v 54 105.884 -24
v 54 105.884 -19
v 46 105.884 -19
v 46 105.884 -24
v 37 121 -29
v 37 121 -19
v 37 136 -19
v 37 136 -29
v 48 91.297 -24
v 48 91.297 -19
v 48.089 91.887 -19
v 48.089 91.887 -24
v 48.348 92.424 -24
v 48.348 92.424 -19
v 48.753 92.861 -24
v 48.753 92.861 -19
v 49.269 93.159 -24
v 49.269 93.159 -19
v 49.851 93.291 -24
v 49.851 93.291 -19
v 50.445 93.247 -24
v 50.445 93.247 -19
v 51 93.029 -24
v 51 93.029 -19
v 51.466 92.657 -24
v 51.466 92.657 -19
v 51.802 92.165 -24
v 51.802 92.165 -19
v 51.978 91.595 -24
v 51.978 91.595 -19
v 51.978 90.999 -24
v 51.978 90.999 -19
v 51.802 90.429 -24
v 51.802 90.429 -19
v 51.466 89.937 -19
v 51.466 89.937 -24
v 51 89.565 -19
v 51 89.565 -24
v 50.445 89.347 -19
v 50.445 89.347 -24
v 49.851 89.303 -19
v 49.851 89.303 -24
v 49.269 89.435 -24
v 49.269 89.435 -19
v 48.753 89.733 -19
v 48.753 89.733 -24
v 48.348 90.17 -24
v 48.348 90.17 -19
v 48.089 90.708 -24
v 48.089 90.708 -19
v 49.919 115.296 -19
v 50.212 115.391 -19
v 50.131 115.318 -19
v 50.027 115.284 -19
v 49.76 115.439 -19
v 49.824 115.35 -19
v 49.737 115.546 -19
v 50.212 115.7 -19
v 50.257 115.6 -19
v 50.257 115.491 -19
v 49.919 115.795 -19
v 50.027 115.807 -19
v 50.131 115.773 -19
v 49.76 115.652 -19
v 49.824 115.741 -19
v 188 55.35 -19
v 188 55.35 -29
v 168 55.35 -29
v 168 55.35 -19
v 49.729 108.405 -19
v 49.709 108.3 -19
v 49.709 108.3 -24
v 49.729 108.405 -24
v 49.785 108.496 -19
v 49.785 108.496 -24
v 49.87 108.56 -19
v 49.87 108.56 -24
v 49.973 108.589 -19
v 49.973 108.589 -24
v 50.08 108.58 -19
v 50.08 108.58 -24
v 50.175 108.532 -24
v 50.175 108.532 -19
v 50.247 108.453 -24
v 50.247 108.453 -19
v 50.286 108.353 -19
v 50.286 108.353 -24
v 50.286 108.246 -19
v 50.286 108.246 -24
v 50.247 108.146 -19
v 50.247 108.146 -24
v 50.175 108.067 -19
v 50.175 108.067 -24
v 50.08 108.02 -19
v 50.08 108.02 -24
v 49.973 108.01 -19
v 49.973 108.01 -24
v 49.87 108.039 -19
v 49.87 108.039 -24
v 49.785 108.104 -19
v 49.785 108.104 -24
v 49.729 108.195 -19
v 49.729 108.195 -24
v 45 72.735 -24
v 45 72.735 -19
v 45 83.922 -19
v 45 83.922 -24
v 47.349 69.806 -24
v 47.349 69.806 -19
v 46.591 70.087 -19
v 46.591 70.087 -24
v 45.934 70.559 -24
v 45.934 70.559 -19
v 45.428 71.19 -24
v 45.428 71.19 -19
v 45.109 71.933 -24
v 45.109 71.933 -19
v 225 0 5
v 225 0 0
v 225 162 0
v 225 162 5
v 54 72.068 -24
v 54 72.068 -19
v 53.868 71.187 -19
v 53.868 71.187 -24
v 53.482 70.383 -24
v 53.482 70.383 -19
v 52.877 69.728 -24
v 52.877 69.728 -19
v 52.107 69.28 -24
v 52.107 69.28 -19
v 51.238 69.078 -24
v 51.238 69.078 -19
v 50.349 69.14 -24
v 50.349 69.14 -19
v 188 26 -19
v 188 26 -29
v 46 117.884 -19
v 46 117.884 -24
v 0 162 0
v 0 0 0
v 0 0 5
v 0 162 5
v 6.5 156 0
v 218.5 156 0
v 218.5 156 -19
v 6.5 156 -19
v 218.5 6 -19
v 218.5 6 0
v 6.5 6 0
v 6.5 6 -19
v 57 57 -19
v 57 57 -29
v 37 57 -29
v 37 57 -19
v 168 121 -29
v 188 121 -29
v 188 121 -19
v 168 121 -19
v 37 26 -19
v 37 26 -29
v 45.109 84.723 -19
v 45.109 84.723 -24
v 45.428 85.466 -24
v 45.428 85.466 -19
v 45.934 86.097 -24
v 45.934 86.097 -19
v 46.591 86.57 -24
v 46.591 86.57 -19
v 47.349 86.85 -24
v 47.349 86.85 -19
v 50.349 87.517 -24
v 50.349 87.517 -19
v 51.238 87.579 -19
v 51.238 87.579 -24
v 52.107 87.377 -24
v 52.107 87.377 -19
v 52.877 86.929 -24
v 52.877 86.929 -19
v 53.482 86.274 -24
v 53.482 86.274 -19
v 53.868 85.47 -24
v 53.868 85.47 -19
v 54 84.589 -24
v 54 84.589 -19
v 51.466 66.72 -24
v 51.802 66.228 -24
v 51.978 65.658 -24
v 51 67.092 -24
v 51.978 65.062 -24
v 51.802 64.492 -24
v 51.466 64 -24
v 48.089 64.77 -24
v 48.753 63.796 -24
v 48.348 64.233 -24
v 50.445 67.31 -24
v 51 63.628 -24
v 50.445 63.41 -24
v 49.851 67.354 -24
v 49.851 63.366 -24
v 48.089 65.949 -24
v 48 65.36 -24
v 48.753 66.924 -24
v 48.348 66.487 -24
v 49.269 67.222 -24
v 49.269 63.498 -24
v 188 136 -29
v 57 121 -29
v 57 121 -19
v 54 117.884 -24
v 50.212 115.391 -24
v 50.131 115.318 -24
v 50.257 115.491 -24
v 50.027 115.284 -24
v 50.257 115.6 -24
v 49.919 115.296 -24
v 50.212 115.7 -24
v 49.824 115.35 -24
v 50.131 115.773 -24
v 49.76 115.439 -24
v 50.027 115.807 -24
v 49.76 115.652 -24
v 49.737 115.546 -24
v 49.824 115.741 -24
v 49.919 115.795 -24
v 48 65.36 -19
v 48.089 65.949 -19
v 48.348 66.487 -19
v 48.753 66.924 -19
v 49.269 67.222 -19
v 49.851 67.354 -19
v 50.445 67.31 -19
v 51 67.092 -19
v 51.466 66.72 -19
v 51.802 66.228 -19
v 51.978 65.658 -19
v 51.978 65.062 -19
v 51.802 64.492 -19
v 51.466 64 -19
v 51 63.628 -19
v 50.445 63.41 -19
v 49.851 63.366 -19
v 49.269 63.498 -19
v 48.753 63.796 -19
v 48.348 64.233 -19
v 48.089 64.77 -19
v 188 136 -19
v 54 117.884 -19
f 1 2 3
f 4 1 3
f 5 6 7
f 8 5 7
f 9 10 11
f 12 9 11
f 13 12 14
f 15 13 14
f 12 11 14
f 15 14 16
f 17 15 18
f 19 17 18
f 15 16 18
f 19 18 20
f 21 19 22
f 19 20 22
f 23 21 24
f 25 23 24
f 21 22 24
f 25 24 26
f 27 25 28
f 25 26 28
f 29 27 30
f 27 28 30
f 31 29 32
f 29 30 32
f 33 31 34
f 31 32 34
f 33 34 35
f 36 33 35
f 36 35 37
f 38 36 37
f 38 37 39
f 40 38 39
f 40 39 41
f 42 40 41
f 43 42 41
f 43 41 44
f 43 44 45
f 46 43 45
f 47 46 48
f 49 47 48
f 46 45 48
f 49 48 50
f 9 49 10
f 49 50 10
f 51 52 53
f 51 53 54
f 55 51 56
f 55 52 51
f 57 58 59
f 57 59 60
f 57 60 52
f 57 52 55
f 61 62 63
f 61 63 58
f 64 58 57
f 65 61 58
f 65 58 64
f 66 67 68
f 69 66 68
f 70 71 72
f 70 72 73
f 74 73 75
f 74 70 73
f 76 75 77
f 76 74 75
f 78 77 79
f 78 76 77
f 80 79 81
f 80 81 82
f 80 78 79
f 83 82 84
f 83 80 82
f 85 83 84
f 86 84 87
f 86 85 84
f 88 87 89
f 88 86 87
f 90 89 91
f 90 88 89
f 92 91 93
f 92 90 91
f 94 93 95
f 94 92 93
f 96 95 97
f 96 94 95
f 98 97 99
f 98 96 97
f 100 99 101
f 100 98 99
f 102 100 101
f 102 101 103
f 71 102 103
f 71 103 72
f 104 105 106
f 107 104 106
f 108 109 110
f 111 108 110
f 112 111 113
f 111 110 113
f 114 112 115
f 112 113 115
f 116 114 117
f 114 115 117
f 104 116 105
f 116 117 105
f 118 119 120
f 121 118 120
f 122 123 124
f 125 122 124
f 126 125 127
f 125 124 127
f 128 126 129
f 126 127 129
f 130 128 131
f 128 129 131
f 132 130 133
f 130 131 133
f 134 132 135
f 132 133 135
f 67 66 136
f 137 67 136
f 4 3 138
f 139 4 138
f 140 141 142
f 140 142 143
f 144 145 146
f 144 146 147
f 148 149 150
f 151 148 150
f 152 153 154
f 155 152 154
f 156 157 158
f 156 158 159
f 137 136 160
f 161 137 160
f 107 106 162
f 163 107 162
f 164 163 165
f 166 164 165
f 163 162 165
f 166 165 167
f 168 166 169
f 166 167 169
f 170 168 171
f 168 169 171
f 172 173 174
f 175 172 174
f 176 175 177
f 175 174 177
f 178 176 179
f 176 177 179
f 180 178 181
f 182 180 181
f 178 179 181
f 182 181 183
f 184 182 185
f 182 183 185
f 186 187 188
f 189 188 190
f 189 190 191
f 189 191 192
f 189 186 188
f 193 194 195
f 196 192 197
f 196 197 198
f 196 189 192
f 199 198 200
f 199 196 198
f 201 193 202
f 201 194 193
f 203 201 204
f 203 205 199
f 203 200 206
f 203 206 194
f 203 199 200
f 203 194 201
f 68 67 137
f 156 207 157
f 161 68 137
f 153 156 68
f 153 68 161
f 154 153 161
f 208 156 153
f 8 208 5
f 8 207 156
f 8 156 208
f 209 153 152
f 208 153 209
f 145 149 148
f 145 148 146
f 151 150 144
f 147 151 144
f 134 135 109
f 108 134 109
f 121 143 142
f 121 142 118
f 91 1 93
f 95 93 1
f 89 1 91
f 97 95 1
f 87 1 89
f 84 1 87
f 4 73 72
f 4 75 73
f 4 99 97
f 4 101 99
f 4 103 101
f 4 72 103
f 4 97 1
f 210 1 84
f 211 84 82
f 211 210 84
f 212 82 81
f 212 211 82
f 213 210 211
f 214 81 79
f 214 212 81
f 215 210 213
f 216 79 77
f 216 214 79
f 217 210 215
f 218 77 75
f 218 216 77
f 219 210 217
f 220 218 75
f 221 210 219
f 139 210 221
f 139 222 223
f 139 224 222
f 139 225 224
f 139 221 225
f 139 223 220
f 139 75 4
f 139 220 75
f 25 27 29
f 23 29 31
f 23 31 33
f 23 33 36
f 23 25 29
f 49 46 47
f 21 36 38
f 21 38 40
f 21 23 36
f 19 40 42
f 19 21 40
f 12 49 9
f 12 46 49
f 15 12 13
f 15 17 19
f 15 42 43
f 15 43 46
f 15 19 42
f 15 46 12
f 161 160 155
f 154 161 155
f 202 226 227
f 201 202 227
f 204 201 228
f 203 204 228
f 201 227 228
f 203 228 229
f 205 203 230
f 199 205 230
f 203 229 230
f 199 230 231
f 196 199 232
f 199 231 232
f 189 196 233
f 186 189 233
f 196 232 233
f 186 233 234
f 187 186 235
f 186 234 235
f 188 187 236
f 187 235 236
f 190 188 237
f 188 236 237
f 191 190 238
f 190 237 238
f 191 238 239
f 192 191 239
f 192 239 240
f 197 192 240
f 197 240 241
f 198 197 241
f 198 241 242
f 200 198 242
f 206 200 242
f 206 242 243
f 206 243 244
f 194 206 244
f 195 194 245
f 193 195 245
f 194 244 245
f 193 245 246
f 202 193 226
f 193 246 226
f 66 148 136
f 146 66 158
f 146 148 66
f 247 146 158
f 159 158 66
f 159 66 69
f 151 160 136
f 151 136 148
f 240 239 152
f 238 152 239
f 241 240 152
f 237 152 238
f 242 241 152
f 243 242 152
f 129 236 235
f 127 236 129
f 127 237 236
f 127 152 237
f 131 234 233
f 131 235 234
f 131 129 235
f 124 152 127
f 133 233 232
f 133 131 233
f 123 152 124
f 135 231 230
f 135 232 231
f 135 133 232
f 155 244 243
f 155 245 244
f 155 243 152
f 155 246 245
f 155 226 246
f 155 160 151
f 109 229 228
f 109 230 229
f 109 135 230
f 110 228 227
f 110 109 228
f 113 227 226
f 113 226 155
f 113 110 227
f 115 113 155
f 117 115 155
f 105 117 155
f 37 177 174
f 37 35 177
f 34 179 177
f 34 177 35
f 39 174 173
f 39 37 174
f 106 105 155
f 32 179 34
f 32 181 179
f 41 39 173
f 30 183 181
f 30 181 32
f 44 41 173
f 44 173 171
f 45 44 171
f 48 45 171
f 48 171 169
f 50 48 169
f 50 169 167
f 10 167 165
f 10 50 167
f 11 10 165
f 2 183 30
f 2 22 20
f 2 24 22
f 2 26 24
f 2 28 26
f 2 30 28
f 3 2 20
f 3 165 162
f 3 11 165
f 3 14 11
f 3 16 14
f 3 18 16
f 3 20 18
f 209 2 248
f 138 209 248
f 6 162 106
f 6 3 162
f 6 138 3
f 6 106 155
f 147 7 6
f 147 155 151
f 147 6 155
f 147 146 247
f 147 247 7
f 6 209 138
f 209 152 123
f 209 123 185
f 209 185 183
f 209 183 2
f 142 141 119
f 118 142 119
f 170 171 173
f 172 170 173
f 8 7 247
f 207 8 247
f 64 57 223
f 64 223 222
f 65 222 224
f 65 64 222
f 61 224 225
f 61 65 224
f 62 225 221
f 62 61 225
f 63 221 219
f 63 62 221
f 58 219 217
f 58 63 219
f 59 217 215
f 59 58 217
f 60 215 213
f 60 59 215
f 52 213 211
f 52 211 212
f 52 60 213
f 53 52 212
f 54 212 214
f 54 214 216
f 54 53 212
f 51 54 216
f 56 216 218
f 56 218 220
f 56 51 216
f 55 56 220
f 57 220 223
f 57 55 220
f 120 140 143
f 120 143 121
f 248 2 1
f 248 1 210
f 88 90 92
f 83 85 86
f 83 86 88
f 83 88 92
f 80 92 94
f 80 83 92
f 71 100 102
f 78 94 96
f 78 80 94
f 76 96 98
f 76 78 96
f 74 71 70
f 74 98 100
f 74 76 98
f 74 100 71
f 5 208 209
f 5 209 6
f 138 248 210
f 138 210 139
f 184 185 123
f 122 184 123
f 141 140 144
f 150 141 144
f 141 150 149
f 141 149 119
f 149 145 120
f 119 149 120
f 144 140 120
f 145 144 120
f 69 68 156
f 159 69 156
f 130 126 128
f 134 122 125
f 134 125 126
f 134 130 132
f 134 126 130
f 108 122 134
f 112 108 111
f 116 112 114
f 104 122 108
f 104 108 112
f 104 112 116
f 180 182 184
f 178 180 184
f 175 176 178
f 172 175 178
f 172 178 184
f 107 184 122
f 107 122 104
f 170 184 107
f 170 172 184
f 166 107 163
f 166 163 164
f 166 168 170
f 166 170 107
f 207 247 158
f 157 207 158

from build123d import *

# Parameters (mm, degrees)
SKETCH_1_W          = 225
SKETCH_1_H          = 162
EXTRUDE_1_DEPTH     = 5
SKETCH_3_W          = 212
SKETCH_3_H          = 150
EXTRUDE_2_DEPTH     = 19
EXTRUDE_3_DEPTH     = 10
SKETCH_5_W          = 20
SKETCH_5_H          = 65.649810637
SKETCH_5_H_2        = 64
CUT_EXTRUDE_1_DEPTH = 10
SKETCH_7_R          = 2
SKETCH_7_W          = 8
SKETCH_7_H          = 12
SKETCH_7_R_2        = 0.262594618
SKETCH_7_R_3        = 0.290999542
EXTRUDE_4_DEPTH     = 5


with BuildPart() as part:
    # 草图1 → 凸台-拉伸1 (new body)
    with BuildSketch(Plane.XY):
        with Locations((112.5, 81)):
            Rectangle(SKETCH_1_W, SKETCH_1_H)
    extrude(amount=EXTRUDE_1_DEPTH)

    # 草图3 → 凸台-拉伸2 (add)
    with BuildSketch(Plane(origin=(0, 0, 0), x_dir=(-1, 0, 0), z_dir=(0, 0, -1))):
        with Locations((-112.5, 81)):
            Rectangle(SKETCH_3_W, SKETCH_3_H)
    extrude(amount=EXTRUDE_2_DEPTH)

    # 草图4 → 凸台-拉伸3 (add)
    with BuildSketch(Plane(origin=(0, 0, -19), x_dir=(-1, 0, 0), z_dir=(0, 0, -1))):
        Polygon((-112.5, 136), (-188, 136), (-188, 26), (-37, 26), (-37, 136), align=None)
    extrude(amount=EXTRUDE_3_DEPTH)

    # 草图5 → 切除-拉伸1 (cut)
    with BuildSketch(Plane(origin=(0, 0, -29), x_dir=(-1, 0, 0), z_dir=(0, 0, -1))):
        with Locations((-178, 88.175094682)):
            Rectangle(SKETCH_5_W, SKETCH_5_H)
        with Locations((-47, 89)):
            Rectangle(SKETCH_5_W, SKETCH_5_H_2)
    extrude(amount=-CUT_EXTRUDE_1_DEPTH, mode=Mode.SUBTRACT)

    # 草图7 → 凸台-拉伸4 (add)
    with BuildSketch(Plane(origin=(0, 0, -19), x_dir=(-1, 0, 0), z_dir=(0, 0, -1))):
        with Locations((-50, 65.359909726)):
            Circle(SKETCH_7_R)
        with Locations((-50, 91.297088519)):
            Circle(SKETCH_7_R)
        with Locations((-50, 111.883776524)):
            Rectangle(SKETCH_7_W, SKETCH_7_H)
        with Locations((-50, 115.545534251)):
            Circle(SKETCH_7_R_2, mode=Mode.SUBTRACT)
        with Locations((-50, 108.299645663)):
            Circle(SKETCH_7_R_3, mode=Mode.SUBTRACT)
        with BuildLine():
            Line((-54, 84.588527339), (-54, 72.068223644))
            ThreePointArc((-54, 72.068223644), (-52.877182181, 69.728098207), (-50.349208627, 69.139662463))
            Line((-50.349208627, 69.139662463), (-47.349208627, 69.80632913))
            ThreePointArc((-47.349208627, 69.80632913), (-45.659874563, 70.85770813), (-45, 72.73489031))
            Line((-45, 72.73489031), (-45, 83.921860672))
            ThreePointArc((-45, 83.921860672), (-45.659874563, 85.799042853), (-47.349208627, 86.850421853))
            Line((-47.349208627, 86.850421853), (-50.349208627, 87.517088519))
            ThreePointArc((-50.349208627, 87.517088519), (-52.877182181, 86.928652776), (-54, 84.588527339))
        make_face()
    extrude(amount=EXTRUDE_4_DEPTH)


solid = part.part
